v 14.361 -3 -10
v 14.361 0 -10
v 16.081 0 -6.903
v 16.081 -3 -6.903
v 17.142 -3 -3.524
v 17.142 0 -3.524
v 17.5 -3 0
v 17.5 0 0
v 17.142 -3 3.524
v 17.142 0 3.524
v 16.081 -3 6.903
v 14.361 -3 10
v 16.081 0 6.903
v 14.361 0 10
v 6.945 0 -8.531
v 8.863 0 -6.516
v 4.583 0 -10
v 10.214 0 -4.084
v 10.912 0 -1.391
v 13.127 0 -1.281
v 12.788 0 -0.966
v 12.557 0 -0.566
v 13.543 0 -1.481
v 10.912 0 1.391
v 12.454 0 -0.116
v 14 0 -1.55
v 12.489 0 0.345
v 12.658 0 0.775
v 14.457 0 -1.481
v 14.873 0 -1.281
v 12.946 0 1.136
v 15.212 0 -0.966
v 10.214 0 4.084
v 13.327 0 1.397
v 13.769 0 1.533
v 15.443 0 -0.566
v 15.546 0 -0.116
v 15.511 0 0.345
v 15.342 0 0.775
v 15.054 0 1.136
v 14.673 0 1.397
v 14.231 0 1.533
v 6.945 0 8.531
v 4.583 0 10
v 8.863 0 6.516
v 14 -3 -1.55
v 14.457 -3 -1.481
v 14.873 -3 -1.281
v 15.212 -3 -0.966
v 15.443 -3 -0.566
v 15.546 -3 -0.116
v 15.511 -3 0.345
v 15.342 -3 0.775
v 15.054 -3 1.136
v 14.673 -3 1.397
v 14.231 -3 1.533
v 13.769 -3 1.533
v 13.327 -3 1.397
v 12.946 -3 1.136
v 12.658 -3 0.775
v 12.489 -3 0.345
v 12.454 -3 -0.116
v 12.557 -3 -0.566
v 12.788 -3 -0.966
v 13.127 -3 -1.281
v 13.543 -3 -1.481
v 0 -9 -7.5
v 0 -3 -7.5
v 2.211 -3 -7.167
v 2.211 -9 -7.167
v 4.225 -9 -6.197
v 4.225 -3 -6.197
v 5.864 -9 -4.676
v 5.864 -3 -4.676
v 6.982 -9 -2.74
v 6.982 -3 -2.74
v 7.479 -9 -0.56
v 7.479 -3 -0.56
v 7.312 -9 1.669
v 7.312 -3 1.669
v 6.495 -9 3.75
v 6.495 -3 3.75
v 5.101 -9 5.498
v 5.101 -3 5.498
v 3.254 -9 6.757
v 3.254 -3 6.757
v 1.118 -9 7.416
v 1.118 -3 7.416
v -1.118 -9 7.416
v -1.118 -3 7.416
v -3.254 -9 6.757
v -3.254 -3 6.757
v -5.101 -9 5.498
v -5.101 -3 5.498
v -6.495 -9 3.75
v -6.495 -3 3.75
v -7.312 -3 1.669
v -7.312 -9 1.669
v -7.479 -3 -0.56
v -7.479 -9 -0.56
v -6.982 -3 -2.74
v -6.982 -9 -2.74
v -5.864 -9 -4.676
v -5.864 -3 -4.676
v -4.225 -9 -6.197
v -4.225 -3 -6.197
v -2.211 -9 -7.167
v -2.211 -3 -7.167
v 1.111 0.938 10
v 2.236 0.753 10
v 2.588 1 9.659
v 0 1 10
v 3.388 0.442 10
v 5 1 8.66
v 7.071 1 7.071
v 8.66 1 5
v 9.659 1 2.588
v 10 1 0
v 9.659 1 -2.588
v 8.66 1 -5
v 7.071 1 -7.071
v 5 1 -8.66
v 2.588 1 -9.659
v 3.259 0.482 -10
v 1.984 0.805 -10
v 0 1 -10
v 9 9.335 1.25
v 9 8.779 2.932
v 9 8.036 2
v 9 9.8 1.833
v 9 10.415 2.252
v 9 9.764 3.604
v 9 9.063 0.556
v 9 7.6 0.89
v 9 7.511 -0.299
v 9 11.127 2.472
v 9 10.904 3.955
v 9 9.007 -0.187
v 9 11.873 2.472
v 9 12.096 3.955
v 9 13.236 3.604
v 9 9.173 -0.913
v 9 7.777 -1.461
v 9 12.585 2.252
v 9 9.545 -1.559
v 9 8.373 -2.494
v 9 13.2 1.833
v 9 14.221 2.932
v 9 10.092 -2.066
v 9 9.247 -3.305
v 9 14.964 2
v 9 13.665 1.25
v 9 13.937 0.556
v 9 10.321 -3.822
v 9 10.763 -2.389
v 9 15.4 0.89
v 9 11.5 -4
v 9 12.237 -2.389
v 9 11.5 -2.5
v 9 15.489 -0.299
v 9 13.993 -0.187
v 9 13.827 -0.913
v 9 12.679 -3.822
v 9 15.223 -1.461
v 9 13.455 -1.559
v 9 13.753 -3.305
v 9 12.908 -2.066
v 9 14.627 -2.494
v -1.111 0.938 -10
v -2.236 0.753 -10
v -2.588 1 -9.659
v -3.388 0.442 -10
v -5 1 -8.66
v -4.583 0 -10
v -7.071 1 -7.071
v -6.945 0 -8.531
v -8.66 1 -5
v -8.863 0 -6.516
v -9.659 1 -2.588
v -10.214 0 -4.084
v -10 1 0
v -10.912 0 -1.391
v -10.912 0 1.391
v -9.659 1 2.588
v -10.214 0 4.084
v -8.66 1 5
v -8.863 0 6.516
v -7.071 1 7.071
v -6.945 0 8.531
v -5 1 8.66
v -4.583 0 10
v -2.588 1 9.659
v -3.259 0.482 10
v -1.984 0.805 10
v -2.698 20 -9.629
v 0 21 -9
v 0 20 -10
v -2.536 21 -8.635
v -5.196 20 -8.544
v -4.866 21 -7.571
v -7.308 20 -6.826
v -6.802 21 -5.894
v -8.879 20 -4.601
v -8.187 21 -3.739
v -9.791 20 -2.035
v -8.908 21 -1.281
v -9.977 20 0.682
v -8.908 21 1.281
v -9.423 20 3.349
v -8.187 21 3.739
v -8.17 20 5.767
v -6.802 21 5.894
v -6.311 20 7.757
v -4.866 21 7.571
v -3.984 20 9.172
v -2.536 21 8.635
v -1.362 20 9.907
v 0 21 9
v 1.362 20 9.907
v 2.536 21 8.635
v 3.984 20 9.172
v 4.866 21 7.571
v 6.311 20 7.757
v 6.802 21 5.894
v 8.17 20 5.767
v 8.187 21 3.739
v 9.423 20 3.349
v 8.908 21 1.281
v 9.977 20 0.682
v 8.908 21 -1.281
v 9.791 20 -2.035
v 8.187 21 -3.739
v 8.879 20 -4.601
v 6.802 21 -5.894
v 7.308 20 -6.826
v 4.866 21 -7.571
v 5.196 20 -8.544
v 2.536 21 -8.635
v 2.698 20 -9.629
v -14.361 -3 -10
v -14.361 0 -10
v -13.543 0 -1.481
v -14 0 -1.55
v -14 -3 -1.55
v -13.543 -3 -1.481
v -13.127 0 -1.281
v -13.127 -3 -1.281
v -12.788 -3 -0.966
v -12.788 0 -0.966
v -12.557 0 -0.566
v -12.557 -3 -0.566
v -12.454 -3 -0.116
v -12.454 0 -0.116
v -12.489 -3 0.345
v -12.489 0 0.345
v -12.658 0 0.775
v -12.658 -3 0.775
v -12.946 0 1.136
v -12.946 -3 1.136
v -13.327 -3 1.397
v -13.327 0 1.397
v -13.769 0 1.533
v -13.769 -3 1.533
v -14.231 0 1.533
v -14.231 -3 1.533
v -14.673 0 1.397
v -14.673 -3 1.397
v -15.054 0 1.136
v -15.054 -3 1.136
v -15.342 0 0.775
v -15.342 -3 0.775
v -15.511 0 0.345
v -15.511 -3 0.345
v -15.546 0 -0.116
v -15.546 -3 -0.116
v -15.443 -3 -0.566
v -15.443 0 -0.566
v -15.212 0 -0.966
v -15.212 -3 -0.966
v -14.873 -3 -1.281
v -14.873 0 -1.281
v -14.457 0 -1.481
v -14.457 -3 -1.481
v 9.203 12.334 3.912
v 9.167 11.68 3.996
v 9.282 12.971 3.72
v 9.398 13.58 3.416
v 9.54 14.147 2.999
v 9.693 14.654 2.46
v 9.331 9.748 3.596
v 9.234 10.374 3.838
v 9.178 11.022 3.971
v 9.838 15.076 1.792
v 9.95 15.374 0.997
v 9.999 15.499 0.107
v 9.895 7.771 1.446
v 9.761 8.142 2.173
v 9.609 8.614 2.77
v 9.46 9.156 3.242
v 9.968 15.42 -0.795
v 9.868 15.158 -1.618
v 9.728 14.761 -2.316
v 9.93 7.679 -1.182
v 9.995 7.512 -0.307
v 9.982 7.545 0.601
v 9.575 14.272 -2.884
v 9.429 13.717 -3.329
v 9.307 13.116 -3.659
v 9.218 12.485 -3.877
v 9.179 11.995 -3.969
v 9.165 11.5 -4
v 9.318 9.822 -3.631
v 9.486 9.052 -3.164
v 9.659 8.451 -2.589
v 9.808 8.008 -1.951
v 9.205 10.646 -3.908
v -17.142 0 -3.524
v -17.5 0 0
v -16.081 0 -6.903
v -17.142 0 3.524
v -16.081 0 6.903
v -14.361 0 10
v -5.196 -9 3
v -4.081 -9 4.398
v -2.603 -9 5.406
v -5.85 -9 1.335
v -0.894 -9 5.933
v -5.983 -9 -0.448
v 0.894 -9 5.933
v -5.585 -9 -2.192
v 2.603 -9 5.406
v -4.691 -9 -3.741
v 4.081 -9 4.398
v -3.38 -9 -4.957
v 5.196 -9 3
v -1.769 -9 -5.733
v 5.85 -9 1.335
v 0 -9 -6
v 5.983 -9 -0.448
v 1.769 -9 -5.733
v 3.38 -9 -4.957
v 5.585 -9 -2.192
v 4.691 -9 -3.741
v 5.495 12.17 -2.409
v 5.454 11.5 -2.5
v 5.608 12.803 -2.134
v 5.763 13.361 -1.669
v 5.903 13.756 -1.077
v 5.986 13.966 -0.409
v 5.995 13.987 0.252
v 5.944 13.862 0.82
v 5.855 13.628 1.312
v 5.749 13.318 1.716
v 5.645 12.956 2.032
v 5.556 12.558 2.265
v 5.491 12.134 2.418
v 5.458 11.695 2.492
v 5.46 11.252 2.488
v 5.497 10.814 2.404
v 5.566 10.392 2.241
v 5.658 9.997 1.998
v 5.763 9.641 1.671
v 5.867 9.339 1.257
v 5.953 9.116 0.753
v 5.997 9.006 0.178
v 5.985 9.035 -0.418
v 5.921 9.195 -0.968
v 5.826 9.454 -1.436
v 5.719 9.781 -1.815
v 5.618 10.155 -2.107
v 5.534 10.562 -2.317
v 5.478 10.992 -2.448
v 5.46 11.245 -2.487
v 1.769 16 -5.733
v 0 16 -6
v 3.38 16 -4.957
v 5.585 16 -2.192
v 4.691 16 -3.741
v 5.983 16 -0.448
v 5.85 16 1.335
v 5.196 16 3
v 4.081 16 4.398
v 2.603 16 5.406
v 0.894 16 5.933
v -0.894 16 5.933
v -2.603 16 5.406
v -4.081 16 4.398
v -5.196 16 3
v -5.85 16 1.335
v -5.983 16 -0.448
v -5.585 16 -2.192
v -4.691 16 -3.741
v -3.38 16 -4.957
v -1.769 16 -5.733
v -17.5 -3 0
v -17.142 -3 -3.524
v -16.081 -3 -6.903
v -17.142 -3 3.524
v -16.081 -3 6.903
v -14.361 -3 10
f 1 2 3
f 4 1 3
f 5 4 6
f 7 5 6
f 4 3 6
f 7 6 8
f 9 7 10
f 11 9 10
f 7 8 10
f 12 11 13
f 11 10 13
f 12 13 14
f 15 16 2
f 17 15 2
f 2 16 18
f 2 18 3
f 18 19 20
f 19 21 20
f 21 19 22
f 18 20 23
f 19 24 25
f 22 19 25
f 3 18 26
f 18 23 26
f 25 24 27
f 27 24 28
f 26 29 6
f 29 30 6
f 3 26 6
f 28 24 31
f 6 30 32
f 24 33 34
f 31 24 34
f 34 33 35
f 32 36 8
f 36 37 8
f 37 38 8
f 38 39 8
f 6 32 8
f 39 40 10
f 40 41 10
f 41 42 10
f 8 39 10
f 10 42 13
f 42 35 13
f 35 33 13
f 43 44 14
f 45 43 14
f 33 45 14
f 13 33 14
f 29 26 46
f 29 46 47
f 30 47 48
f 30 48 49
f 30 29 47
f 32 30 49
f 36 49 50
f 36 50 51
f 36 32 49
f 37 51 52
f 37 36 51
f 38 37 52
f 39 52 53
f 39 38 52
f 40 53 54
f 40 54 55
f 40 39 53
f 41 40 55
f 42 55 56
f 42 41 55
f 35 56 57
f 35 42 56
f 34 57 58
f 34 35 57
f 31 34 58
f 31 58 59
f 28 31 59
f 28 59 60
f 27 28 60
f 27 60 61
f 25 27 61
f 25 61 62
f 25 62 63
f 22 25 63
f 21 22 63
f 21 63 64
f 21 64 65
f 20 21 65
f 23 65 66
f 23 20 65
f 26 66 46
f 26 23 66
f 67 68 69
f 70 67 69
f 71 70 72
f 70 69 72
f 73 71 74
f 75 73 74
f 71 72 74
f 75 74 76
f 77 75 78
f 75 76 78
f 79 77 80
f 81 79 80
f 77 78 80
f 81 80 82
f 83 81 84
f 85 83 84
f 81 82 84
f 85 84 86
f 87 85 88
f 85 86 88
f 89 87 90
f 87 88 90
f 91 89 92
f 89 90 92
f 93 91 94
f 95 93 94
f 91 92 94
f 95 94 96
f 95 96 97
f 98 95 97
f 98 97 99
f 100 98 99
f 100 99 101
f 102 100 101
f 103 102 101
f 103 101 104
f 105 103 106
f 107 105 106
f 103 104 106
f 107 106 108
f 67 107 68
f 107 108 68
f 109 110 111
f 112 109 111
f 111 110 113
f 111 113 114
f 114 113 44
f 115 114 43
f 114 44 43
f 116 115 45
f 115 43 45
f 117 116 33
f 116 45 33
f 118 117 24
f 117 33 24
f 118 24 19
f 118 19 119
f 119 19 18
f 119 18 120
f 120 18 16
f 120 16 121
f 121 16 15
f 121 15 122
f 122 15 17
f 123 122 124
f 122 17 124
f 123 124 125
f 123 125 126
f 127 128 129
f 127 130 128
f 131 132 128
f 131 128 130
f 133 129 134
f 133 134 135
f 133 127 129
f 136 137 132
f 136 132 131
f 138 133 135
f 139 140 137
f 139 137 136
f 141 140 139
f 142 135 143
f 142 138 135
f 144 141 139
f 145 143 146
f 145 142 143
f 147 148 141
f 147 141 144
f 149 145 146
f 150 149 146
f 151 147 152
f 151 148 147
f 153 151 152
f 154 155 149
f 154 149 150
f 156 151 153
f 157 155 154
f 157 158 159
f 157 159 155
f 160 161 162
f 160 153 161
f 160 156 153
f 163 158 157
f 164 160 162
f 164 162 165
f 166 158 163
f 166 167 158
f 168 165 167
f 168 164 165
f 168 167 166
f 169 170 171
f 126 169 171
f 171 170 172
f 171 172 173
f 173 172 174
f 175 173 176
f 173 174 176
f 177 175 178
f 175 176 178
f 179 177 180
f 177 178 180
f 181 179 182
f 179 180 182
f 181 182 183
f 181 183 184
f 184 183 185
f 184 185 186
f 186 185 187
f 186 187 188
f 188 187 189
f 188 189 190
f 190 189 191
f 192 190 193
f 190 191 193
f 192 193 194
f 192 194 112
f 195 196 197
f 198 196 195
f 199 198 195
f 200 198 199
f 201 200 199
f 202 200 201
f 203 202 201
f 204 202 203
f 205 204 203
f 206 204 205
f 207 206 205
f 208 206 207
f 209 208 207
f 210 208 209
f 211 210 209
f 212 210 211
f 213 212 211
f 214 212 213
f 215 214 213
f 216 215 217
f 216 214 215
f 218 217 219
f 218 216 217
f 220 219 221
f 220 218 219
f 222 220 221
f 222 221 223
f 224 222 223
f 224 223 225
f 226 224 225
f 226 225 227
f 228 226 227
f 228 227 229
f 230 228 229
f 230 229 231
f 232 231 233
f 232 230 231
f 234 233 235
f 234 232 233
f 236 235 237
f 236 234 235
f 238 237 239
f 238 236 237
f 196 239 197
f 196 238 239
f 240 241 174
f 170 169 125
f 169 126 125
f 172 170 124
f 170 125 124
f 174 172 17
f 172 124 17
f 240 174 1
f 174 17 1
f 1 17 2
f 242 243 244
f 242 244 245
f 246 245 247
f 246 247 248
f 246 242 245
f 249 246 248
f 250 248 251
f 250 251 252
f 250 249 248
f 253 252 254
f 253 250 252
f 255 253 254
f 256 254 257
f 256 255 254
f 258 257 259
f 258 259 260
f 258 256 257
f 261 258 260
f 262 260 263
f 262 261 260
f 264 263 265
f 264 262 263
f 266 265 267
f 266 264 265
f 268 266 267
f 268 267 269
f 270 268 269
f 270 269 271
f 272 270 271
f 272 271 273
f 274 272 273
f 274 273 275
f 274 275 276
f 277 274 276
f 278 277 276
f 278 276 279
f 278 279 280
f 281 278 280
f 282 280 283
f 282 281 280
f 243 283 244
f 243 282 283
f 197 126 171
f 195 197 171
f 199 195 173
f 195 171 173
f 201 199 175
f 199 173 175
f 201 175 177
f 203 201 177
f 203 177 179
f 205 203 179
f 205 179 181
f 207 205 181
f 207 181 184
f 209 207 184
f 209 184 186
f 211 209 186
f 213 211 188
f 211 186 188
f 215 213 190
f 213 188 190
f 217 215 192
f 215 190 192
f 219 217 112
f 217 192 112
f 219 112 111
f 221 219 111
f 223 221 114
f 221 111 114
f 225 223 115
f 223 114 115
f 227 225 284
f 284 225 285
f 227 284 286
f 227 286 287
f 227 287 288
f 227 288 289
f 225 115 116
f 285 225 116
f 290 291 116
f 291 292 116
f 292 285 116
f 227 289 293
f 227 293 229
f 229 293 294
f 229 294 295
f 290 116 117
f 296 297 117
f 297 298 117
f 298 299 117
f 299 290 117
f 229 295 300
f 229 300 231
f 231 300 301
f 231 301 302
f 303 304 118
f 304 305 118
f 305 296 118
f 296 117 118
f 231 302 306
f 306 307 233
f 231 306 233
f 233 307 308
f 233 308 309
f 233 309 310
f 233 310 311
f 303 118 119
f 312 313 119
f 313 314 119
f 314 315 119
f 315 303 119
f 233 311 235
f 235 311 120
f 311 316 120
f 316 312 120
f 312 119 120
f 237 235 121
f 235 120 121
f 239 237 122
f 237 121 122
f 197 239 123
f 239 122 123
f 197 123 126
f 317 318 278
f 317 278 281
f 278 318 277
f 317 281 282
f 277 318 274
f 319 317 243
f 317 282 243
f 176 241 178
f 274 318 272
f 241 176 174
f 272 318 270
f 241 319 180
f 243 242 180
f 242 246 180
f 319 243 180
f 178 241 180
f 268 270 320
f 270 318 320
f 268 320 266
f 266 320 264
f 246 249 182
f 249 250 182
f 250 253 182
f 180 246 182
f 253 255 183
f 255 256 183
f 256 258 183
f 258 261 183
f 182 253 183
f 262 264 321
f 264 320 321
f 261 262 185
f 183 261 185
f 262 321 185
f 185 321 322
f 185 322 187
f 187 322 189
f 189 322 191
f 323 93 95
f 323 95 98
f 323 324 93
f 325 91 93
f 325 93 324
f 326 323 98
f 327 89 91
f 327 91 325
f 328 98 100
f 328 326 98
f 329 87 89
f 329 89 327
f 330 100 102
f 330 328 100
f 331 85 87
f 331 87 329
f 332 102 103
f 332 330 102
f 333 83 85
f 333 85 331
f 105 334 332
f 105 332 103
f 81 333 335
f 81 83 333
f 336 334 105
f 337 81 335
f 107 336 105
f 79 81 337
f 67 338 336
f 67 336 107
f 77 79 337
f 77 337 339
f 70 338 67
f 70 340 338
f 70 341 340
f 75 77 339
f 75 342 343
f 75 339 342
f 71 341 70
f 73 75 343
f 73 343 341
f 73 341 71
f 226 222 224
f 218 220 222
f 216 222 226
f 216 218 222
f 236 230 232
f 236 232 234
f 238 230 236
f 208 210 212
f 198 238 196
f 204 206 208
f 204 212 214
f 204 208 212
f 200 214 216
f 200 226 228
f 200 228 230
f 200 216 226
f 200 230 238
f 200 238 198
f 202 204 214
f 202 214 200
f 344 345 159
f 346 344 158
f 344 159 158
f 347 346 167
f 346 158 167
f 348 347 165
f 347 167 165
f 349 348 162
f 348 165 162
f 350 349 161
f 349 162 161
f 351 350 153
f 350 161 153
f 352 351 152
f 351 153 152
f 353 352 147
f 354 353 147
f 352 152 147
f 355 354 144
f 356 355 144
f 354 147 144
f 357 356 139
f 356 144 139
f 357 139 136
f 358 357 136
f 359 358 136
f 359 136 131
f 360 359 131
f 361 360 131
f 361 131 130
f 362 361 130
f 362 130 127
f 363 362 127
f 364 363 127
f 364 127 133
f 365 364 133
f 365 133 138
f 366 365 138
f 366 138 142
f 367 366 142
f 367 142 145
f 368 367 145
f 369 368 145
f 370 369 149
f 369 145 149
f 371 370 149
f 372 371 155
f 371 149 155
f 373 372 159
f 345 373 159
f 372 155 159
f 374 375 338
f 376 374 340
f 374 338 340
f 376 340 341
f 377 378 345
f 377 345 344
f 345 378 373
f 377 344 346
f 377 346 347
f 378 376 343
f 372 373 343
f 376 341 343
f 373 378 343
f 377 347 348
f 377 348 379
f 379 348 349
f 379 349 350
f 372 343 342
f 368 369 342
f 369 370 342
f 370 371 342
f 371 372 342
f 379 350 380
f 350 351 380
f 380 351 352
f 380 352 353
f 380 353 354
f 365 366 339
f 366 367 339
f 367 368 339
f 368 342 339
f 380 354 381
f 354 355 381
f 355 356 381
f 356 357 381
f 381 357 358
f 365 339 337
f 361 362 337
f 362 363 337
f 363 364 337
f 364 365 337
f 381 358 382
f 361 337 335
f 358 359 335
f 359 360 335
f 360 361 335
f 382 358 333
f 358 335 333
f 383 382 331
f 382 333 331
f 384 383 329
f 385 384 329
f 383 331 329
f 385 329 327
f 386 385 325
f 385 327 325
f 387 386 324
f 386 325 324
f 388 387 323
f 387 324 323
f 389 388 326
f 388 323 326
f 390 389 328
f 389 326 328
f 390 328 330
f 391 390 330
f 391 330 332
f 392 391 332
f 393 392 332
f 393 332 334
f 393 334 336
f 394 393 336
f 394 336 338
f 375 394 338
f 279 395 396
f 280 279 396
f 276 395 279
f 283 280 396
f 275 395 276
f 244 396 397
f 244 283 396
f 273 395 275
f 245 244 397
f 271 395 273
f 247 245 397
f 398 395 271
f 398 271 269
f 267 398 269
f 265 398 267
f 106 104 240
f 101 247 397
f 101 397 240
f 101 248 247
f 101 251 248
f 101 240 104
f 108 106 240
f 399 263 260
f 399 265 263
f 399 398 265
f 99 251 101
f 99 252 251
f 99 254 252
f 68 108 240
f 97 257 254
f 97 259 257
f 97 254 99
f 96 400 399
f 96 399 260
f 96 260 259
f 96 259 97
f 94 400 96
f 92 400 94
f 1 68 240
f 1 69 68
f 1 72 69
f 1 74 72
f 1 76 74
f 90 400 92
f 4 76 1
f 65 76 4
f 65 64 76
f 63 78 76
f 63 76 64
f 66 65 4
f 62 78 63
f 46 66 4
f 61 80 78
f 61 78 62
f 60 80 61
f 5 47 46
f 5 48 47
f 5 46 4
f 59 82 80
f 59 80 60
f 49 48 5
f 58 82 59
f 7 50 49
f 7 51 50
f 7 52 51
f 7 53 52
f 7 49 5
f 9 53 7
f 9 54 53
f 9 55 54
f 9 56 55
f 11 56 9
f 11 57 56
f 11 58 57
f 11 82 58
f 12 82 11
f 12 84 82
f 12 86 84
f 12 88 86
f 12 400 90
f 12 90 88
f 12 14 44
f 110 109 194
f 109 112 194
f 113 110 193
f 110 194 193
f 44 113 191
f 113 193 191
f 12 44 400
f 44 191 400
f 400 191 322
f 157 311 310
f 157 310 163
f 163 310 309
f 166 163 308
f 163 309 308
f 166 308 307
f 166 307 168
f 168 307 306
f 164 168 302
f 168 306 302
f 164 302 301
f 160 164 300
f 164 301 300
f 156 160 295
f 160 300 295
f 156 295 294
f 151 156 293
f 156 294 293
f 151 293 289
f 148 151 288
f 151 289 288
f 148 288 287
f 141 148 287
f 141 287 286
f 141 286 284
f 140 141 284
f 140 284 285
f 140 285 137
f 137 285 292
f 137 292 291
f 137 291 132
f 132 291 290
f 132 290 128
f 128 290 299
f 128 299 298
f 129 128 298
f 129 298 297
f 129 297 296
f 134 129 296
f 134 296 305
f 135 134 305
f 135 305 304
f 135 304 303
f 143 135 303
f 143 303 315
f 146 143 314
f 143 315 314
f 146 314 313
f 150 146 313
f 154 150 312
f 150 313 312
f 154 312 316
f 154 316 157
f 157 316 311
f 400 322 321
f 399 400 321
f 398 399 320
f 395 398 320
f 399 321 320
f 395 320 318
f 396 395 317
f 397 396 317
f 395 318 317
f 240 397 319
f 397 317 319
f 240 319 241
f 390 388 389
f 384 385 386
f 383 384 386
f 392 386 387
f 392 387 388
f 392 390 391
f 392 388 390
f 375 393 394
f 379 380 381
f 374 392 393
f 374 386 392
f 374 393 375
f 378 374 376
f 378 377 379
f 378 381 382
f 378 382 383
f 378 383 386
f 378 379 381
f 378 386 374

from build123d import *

# Parameters (mm, degrees)
SKETCH1_R           = 10
BOSS_EXTRUDE1_DEPTH = 21
SKETCH2_R           = 1.55
BOSS_EXTRUDE2_DEPTH = 3
SKETCH3_R           = 7.5
BOSS_EXTRUDE3_DEPTH = 6
SKETCH4_R           = 6
CUT_EXTRUDE1_DEPTH  = 25
SKETCH6_R           = 4
CUT_EXTRUDE2_DEPTH  = 1
SKETCH7_R           = 2.5
CUT_EXTRUDE3_DEPTH  = 6
CHAMFER1_SIZE       = 1


with BuildPart() as part:
    # Sketch1 → Boss-Extrude1 (new body)
    with BuildSketch(Plane(origin=(0, 0, 0), x_dir=(1, 0, 0), z_dir=(0, 1, 0))):
        with Locations(Location((0, 0, 0), (0, 0, 90))):
            Circle(SKETCH1_R)
    extrude(amount=BOSS_EXTRUDE1_DEPTH)

    # Sketch2 → Boss-Extrude2 (add)
    with BuildSketch(Plane.XZ):
        with BuildLine():
            Line((-14.361406616, -10), (14.361406616, -10))
            ThreePointArc((14.361406616, -10), (17.5, 0), (14.361406616, 10))
            Line((14.361406616, 10), (-14.361406616, 10))
            ThreePointArc((-14.361406616, 10), (-17.5, 0), (-14.361406616, -10))
        make_face()
        with Locations(Location((-14, 0, 0), (0, 0, 270))):
            Circle(SKETCH2_R, mode=Mode.SUBTRACT)
        with Locations(Location((14, 0, 0), (0, 0, 270))):
            Circle(SKETCH2_R, mode=Mode.SUBTRACT)
    extrude(amount=BOSS_EXTRUDE2_DEPTH)

    # Sketch3 → Boss-Extrude3 (add)
    with BuildSketch(Plane.XZ.offset(3)):
        with Locations(Location((0, 0, 0), (0, 0, 270))):
            Circle(SKETCH3_R)
    extrude(amount=BOSS_EXTRUDE3_DEPTH)

    # Sketch4 → Cut-Extrude1 (cut)
    with BuildSketch(Plane.XZ.offset(9)):
        with Locations(Location((0, 0, 0), (0, 0, 270))):
            Circle(SKETCH4_R)
    extrude(amount=-CUT_EXTRUDE1_DEPTH, mode=Mode.SUBTRACT)

    # Sketch6 → Cut-Extrude2 (cut)
    with BuildSketch(Plane(origin=(10, 0, 0), x_dir=(0, 0, -1), z_dir=(1, 0, 0))):
        with Locations((0, 11.5)):
            Circle(SKETCH6_R)
    extrude(amount=-CUT_EXTRUDE2_DEPTH, mode=Mode.SUBTRACT)

    # Sketch7 → Cut-Extrude3 (cut)
    with BuildSketch(Plane(origin=(9, 0, 0), x_dir=(0, 0, -1), z_dir=(1, 0, 0))):
        with Locations((0, 11.5)):
            Circle(SKETCH7_R)
    extrude(amount=-CUT_EXTRUDE3_DEPTH, mode=Mode.SUBTRACT)

    # Chamfer1
    # the kernel refuses this chamfer: 1 mm, written as the material it adds along each edge
    with BuildSketch(Plane(origin=(0, 0, 0), x_dir=(-2.2377941338409155e-09, 0, 1.0), z_dir=(-1.0, 0, -2.2377941338409155e-09))) as chamfer1_piece_1_section:
        Polygon((10, CHAMFER1_SIZE), (10 + CHAMFER1_SIZE, 0), (10, 0), align=None)
    chamfer1_piece_1 = revolve(axis=Axis((0, 0, 0), (0, 1, 0)), revolution_arc=180.000000128, mode=Mode.PRIVATE)
    chamfer1_piece_1 = split(chamfer1_piece_1, bisect_by=Plane(origin=(10.483044341, 0.483044342, -10), z_dir=(0, 0, 1)), keep=Keep.TOP, mode=Mode.PRIVATE)
    chamfer1_piece_1 = split(chamfer1_piece_1, bisect_by=Plane(origin=(10.483044341, 0.483044342, 10), z_dir=(0, 0, -1)), keep=Keep.TOP, mode=Mode.PRIVATE)
    add(chamfer1_piece_1)
    with BuildSketch(Plane(origin=(0, 0, 0), x_dir=(0, 0, -1), z_dir=(1, 0, 0))) as chamfer1_piece_2_section:
        Polygon((10, CHAMFER1_SIZE), (10 + CHAMFER1_SIZE, 0), (10, 0), align=None)
    chamfer1_piece_2 = revolve(axis=Axis((0, 0, 0), (0, 1, 0)), revolution_arc=179.999999872, mode=Mode.PRIVATE)
    chamfer1_piece_2 = split(chamfer1_piece_2, bisect_by=Plane(origin=(-10.483044341, 0.483044341, -10), z_dir=(0, 0, 1)), keep=Keep.TOP, mode=Mode.PRIVATE)
    chamfer1_piece_2 = split(chamfer1_piece_2, bisect_by=Plane(origin=(-10.483044341, 0.483044341, 10), z_dir=(0, 0, -1)), keep=Keep.TOP, mode=Mode.PRIVATE)
    add(chamfer1_piece_2)
    # the kernel refuses this chamfer: 1 mm, written as the material it takes off along each edge
    with BuildSketch(Plane(origin=(0, 21, 0), x_dir=(0, 0, -1), z_dir=(1, 0, 0))) as chamfer1_2_piece_1:
        Polygon((10, -CHAMFER1_SIZE), (10 - CHAMFER1_SIZE, 0), (10, 0), align=None)
    revolve(axis=Axis((0, 21, 0), (0, 1, 0)), mode=Mode.SUBTRACT)


solid = part.part
